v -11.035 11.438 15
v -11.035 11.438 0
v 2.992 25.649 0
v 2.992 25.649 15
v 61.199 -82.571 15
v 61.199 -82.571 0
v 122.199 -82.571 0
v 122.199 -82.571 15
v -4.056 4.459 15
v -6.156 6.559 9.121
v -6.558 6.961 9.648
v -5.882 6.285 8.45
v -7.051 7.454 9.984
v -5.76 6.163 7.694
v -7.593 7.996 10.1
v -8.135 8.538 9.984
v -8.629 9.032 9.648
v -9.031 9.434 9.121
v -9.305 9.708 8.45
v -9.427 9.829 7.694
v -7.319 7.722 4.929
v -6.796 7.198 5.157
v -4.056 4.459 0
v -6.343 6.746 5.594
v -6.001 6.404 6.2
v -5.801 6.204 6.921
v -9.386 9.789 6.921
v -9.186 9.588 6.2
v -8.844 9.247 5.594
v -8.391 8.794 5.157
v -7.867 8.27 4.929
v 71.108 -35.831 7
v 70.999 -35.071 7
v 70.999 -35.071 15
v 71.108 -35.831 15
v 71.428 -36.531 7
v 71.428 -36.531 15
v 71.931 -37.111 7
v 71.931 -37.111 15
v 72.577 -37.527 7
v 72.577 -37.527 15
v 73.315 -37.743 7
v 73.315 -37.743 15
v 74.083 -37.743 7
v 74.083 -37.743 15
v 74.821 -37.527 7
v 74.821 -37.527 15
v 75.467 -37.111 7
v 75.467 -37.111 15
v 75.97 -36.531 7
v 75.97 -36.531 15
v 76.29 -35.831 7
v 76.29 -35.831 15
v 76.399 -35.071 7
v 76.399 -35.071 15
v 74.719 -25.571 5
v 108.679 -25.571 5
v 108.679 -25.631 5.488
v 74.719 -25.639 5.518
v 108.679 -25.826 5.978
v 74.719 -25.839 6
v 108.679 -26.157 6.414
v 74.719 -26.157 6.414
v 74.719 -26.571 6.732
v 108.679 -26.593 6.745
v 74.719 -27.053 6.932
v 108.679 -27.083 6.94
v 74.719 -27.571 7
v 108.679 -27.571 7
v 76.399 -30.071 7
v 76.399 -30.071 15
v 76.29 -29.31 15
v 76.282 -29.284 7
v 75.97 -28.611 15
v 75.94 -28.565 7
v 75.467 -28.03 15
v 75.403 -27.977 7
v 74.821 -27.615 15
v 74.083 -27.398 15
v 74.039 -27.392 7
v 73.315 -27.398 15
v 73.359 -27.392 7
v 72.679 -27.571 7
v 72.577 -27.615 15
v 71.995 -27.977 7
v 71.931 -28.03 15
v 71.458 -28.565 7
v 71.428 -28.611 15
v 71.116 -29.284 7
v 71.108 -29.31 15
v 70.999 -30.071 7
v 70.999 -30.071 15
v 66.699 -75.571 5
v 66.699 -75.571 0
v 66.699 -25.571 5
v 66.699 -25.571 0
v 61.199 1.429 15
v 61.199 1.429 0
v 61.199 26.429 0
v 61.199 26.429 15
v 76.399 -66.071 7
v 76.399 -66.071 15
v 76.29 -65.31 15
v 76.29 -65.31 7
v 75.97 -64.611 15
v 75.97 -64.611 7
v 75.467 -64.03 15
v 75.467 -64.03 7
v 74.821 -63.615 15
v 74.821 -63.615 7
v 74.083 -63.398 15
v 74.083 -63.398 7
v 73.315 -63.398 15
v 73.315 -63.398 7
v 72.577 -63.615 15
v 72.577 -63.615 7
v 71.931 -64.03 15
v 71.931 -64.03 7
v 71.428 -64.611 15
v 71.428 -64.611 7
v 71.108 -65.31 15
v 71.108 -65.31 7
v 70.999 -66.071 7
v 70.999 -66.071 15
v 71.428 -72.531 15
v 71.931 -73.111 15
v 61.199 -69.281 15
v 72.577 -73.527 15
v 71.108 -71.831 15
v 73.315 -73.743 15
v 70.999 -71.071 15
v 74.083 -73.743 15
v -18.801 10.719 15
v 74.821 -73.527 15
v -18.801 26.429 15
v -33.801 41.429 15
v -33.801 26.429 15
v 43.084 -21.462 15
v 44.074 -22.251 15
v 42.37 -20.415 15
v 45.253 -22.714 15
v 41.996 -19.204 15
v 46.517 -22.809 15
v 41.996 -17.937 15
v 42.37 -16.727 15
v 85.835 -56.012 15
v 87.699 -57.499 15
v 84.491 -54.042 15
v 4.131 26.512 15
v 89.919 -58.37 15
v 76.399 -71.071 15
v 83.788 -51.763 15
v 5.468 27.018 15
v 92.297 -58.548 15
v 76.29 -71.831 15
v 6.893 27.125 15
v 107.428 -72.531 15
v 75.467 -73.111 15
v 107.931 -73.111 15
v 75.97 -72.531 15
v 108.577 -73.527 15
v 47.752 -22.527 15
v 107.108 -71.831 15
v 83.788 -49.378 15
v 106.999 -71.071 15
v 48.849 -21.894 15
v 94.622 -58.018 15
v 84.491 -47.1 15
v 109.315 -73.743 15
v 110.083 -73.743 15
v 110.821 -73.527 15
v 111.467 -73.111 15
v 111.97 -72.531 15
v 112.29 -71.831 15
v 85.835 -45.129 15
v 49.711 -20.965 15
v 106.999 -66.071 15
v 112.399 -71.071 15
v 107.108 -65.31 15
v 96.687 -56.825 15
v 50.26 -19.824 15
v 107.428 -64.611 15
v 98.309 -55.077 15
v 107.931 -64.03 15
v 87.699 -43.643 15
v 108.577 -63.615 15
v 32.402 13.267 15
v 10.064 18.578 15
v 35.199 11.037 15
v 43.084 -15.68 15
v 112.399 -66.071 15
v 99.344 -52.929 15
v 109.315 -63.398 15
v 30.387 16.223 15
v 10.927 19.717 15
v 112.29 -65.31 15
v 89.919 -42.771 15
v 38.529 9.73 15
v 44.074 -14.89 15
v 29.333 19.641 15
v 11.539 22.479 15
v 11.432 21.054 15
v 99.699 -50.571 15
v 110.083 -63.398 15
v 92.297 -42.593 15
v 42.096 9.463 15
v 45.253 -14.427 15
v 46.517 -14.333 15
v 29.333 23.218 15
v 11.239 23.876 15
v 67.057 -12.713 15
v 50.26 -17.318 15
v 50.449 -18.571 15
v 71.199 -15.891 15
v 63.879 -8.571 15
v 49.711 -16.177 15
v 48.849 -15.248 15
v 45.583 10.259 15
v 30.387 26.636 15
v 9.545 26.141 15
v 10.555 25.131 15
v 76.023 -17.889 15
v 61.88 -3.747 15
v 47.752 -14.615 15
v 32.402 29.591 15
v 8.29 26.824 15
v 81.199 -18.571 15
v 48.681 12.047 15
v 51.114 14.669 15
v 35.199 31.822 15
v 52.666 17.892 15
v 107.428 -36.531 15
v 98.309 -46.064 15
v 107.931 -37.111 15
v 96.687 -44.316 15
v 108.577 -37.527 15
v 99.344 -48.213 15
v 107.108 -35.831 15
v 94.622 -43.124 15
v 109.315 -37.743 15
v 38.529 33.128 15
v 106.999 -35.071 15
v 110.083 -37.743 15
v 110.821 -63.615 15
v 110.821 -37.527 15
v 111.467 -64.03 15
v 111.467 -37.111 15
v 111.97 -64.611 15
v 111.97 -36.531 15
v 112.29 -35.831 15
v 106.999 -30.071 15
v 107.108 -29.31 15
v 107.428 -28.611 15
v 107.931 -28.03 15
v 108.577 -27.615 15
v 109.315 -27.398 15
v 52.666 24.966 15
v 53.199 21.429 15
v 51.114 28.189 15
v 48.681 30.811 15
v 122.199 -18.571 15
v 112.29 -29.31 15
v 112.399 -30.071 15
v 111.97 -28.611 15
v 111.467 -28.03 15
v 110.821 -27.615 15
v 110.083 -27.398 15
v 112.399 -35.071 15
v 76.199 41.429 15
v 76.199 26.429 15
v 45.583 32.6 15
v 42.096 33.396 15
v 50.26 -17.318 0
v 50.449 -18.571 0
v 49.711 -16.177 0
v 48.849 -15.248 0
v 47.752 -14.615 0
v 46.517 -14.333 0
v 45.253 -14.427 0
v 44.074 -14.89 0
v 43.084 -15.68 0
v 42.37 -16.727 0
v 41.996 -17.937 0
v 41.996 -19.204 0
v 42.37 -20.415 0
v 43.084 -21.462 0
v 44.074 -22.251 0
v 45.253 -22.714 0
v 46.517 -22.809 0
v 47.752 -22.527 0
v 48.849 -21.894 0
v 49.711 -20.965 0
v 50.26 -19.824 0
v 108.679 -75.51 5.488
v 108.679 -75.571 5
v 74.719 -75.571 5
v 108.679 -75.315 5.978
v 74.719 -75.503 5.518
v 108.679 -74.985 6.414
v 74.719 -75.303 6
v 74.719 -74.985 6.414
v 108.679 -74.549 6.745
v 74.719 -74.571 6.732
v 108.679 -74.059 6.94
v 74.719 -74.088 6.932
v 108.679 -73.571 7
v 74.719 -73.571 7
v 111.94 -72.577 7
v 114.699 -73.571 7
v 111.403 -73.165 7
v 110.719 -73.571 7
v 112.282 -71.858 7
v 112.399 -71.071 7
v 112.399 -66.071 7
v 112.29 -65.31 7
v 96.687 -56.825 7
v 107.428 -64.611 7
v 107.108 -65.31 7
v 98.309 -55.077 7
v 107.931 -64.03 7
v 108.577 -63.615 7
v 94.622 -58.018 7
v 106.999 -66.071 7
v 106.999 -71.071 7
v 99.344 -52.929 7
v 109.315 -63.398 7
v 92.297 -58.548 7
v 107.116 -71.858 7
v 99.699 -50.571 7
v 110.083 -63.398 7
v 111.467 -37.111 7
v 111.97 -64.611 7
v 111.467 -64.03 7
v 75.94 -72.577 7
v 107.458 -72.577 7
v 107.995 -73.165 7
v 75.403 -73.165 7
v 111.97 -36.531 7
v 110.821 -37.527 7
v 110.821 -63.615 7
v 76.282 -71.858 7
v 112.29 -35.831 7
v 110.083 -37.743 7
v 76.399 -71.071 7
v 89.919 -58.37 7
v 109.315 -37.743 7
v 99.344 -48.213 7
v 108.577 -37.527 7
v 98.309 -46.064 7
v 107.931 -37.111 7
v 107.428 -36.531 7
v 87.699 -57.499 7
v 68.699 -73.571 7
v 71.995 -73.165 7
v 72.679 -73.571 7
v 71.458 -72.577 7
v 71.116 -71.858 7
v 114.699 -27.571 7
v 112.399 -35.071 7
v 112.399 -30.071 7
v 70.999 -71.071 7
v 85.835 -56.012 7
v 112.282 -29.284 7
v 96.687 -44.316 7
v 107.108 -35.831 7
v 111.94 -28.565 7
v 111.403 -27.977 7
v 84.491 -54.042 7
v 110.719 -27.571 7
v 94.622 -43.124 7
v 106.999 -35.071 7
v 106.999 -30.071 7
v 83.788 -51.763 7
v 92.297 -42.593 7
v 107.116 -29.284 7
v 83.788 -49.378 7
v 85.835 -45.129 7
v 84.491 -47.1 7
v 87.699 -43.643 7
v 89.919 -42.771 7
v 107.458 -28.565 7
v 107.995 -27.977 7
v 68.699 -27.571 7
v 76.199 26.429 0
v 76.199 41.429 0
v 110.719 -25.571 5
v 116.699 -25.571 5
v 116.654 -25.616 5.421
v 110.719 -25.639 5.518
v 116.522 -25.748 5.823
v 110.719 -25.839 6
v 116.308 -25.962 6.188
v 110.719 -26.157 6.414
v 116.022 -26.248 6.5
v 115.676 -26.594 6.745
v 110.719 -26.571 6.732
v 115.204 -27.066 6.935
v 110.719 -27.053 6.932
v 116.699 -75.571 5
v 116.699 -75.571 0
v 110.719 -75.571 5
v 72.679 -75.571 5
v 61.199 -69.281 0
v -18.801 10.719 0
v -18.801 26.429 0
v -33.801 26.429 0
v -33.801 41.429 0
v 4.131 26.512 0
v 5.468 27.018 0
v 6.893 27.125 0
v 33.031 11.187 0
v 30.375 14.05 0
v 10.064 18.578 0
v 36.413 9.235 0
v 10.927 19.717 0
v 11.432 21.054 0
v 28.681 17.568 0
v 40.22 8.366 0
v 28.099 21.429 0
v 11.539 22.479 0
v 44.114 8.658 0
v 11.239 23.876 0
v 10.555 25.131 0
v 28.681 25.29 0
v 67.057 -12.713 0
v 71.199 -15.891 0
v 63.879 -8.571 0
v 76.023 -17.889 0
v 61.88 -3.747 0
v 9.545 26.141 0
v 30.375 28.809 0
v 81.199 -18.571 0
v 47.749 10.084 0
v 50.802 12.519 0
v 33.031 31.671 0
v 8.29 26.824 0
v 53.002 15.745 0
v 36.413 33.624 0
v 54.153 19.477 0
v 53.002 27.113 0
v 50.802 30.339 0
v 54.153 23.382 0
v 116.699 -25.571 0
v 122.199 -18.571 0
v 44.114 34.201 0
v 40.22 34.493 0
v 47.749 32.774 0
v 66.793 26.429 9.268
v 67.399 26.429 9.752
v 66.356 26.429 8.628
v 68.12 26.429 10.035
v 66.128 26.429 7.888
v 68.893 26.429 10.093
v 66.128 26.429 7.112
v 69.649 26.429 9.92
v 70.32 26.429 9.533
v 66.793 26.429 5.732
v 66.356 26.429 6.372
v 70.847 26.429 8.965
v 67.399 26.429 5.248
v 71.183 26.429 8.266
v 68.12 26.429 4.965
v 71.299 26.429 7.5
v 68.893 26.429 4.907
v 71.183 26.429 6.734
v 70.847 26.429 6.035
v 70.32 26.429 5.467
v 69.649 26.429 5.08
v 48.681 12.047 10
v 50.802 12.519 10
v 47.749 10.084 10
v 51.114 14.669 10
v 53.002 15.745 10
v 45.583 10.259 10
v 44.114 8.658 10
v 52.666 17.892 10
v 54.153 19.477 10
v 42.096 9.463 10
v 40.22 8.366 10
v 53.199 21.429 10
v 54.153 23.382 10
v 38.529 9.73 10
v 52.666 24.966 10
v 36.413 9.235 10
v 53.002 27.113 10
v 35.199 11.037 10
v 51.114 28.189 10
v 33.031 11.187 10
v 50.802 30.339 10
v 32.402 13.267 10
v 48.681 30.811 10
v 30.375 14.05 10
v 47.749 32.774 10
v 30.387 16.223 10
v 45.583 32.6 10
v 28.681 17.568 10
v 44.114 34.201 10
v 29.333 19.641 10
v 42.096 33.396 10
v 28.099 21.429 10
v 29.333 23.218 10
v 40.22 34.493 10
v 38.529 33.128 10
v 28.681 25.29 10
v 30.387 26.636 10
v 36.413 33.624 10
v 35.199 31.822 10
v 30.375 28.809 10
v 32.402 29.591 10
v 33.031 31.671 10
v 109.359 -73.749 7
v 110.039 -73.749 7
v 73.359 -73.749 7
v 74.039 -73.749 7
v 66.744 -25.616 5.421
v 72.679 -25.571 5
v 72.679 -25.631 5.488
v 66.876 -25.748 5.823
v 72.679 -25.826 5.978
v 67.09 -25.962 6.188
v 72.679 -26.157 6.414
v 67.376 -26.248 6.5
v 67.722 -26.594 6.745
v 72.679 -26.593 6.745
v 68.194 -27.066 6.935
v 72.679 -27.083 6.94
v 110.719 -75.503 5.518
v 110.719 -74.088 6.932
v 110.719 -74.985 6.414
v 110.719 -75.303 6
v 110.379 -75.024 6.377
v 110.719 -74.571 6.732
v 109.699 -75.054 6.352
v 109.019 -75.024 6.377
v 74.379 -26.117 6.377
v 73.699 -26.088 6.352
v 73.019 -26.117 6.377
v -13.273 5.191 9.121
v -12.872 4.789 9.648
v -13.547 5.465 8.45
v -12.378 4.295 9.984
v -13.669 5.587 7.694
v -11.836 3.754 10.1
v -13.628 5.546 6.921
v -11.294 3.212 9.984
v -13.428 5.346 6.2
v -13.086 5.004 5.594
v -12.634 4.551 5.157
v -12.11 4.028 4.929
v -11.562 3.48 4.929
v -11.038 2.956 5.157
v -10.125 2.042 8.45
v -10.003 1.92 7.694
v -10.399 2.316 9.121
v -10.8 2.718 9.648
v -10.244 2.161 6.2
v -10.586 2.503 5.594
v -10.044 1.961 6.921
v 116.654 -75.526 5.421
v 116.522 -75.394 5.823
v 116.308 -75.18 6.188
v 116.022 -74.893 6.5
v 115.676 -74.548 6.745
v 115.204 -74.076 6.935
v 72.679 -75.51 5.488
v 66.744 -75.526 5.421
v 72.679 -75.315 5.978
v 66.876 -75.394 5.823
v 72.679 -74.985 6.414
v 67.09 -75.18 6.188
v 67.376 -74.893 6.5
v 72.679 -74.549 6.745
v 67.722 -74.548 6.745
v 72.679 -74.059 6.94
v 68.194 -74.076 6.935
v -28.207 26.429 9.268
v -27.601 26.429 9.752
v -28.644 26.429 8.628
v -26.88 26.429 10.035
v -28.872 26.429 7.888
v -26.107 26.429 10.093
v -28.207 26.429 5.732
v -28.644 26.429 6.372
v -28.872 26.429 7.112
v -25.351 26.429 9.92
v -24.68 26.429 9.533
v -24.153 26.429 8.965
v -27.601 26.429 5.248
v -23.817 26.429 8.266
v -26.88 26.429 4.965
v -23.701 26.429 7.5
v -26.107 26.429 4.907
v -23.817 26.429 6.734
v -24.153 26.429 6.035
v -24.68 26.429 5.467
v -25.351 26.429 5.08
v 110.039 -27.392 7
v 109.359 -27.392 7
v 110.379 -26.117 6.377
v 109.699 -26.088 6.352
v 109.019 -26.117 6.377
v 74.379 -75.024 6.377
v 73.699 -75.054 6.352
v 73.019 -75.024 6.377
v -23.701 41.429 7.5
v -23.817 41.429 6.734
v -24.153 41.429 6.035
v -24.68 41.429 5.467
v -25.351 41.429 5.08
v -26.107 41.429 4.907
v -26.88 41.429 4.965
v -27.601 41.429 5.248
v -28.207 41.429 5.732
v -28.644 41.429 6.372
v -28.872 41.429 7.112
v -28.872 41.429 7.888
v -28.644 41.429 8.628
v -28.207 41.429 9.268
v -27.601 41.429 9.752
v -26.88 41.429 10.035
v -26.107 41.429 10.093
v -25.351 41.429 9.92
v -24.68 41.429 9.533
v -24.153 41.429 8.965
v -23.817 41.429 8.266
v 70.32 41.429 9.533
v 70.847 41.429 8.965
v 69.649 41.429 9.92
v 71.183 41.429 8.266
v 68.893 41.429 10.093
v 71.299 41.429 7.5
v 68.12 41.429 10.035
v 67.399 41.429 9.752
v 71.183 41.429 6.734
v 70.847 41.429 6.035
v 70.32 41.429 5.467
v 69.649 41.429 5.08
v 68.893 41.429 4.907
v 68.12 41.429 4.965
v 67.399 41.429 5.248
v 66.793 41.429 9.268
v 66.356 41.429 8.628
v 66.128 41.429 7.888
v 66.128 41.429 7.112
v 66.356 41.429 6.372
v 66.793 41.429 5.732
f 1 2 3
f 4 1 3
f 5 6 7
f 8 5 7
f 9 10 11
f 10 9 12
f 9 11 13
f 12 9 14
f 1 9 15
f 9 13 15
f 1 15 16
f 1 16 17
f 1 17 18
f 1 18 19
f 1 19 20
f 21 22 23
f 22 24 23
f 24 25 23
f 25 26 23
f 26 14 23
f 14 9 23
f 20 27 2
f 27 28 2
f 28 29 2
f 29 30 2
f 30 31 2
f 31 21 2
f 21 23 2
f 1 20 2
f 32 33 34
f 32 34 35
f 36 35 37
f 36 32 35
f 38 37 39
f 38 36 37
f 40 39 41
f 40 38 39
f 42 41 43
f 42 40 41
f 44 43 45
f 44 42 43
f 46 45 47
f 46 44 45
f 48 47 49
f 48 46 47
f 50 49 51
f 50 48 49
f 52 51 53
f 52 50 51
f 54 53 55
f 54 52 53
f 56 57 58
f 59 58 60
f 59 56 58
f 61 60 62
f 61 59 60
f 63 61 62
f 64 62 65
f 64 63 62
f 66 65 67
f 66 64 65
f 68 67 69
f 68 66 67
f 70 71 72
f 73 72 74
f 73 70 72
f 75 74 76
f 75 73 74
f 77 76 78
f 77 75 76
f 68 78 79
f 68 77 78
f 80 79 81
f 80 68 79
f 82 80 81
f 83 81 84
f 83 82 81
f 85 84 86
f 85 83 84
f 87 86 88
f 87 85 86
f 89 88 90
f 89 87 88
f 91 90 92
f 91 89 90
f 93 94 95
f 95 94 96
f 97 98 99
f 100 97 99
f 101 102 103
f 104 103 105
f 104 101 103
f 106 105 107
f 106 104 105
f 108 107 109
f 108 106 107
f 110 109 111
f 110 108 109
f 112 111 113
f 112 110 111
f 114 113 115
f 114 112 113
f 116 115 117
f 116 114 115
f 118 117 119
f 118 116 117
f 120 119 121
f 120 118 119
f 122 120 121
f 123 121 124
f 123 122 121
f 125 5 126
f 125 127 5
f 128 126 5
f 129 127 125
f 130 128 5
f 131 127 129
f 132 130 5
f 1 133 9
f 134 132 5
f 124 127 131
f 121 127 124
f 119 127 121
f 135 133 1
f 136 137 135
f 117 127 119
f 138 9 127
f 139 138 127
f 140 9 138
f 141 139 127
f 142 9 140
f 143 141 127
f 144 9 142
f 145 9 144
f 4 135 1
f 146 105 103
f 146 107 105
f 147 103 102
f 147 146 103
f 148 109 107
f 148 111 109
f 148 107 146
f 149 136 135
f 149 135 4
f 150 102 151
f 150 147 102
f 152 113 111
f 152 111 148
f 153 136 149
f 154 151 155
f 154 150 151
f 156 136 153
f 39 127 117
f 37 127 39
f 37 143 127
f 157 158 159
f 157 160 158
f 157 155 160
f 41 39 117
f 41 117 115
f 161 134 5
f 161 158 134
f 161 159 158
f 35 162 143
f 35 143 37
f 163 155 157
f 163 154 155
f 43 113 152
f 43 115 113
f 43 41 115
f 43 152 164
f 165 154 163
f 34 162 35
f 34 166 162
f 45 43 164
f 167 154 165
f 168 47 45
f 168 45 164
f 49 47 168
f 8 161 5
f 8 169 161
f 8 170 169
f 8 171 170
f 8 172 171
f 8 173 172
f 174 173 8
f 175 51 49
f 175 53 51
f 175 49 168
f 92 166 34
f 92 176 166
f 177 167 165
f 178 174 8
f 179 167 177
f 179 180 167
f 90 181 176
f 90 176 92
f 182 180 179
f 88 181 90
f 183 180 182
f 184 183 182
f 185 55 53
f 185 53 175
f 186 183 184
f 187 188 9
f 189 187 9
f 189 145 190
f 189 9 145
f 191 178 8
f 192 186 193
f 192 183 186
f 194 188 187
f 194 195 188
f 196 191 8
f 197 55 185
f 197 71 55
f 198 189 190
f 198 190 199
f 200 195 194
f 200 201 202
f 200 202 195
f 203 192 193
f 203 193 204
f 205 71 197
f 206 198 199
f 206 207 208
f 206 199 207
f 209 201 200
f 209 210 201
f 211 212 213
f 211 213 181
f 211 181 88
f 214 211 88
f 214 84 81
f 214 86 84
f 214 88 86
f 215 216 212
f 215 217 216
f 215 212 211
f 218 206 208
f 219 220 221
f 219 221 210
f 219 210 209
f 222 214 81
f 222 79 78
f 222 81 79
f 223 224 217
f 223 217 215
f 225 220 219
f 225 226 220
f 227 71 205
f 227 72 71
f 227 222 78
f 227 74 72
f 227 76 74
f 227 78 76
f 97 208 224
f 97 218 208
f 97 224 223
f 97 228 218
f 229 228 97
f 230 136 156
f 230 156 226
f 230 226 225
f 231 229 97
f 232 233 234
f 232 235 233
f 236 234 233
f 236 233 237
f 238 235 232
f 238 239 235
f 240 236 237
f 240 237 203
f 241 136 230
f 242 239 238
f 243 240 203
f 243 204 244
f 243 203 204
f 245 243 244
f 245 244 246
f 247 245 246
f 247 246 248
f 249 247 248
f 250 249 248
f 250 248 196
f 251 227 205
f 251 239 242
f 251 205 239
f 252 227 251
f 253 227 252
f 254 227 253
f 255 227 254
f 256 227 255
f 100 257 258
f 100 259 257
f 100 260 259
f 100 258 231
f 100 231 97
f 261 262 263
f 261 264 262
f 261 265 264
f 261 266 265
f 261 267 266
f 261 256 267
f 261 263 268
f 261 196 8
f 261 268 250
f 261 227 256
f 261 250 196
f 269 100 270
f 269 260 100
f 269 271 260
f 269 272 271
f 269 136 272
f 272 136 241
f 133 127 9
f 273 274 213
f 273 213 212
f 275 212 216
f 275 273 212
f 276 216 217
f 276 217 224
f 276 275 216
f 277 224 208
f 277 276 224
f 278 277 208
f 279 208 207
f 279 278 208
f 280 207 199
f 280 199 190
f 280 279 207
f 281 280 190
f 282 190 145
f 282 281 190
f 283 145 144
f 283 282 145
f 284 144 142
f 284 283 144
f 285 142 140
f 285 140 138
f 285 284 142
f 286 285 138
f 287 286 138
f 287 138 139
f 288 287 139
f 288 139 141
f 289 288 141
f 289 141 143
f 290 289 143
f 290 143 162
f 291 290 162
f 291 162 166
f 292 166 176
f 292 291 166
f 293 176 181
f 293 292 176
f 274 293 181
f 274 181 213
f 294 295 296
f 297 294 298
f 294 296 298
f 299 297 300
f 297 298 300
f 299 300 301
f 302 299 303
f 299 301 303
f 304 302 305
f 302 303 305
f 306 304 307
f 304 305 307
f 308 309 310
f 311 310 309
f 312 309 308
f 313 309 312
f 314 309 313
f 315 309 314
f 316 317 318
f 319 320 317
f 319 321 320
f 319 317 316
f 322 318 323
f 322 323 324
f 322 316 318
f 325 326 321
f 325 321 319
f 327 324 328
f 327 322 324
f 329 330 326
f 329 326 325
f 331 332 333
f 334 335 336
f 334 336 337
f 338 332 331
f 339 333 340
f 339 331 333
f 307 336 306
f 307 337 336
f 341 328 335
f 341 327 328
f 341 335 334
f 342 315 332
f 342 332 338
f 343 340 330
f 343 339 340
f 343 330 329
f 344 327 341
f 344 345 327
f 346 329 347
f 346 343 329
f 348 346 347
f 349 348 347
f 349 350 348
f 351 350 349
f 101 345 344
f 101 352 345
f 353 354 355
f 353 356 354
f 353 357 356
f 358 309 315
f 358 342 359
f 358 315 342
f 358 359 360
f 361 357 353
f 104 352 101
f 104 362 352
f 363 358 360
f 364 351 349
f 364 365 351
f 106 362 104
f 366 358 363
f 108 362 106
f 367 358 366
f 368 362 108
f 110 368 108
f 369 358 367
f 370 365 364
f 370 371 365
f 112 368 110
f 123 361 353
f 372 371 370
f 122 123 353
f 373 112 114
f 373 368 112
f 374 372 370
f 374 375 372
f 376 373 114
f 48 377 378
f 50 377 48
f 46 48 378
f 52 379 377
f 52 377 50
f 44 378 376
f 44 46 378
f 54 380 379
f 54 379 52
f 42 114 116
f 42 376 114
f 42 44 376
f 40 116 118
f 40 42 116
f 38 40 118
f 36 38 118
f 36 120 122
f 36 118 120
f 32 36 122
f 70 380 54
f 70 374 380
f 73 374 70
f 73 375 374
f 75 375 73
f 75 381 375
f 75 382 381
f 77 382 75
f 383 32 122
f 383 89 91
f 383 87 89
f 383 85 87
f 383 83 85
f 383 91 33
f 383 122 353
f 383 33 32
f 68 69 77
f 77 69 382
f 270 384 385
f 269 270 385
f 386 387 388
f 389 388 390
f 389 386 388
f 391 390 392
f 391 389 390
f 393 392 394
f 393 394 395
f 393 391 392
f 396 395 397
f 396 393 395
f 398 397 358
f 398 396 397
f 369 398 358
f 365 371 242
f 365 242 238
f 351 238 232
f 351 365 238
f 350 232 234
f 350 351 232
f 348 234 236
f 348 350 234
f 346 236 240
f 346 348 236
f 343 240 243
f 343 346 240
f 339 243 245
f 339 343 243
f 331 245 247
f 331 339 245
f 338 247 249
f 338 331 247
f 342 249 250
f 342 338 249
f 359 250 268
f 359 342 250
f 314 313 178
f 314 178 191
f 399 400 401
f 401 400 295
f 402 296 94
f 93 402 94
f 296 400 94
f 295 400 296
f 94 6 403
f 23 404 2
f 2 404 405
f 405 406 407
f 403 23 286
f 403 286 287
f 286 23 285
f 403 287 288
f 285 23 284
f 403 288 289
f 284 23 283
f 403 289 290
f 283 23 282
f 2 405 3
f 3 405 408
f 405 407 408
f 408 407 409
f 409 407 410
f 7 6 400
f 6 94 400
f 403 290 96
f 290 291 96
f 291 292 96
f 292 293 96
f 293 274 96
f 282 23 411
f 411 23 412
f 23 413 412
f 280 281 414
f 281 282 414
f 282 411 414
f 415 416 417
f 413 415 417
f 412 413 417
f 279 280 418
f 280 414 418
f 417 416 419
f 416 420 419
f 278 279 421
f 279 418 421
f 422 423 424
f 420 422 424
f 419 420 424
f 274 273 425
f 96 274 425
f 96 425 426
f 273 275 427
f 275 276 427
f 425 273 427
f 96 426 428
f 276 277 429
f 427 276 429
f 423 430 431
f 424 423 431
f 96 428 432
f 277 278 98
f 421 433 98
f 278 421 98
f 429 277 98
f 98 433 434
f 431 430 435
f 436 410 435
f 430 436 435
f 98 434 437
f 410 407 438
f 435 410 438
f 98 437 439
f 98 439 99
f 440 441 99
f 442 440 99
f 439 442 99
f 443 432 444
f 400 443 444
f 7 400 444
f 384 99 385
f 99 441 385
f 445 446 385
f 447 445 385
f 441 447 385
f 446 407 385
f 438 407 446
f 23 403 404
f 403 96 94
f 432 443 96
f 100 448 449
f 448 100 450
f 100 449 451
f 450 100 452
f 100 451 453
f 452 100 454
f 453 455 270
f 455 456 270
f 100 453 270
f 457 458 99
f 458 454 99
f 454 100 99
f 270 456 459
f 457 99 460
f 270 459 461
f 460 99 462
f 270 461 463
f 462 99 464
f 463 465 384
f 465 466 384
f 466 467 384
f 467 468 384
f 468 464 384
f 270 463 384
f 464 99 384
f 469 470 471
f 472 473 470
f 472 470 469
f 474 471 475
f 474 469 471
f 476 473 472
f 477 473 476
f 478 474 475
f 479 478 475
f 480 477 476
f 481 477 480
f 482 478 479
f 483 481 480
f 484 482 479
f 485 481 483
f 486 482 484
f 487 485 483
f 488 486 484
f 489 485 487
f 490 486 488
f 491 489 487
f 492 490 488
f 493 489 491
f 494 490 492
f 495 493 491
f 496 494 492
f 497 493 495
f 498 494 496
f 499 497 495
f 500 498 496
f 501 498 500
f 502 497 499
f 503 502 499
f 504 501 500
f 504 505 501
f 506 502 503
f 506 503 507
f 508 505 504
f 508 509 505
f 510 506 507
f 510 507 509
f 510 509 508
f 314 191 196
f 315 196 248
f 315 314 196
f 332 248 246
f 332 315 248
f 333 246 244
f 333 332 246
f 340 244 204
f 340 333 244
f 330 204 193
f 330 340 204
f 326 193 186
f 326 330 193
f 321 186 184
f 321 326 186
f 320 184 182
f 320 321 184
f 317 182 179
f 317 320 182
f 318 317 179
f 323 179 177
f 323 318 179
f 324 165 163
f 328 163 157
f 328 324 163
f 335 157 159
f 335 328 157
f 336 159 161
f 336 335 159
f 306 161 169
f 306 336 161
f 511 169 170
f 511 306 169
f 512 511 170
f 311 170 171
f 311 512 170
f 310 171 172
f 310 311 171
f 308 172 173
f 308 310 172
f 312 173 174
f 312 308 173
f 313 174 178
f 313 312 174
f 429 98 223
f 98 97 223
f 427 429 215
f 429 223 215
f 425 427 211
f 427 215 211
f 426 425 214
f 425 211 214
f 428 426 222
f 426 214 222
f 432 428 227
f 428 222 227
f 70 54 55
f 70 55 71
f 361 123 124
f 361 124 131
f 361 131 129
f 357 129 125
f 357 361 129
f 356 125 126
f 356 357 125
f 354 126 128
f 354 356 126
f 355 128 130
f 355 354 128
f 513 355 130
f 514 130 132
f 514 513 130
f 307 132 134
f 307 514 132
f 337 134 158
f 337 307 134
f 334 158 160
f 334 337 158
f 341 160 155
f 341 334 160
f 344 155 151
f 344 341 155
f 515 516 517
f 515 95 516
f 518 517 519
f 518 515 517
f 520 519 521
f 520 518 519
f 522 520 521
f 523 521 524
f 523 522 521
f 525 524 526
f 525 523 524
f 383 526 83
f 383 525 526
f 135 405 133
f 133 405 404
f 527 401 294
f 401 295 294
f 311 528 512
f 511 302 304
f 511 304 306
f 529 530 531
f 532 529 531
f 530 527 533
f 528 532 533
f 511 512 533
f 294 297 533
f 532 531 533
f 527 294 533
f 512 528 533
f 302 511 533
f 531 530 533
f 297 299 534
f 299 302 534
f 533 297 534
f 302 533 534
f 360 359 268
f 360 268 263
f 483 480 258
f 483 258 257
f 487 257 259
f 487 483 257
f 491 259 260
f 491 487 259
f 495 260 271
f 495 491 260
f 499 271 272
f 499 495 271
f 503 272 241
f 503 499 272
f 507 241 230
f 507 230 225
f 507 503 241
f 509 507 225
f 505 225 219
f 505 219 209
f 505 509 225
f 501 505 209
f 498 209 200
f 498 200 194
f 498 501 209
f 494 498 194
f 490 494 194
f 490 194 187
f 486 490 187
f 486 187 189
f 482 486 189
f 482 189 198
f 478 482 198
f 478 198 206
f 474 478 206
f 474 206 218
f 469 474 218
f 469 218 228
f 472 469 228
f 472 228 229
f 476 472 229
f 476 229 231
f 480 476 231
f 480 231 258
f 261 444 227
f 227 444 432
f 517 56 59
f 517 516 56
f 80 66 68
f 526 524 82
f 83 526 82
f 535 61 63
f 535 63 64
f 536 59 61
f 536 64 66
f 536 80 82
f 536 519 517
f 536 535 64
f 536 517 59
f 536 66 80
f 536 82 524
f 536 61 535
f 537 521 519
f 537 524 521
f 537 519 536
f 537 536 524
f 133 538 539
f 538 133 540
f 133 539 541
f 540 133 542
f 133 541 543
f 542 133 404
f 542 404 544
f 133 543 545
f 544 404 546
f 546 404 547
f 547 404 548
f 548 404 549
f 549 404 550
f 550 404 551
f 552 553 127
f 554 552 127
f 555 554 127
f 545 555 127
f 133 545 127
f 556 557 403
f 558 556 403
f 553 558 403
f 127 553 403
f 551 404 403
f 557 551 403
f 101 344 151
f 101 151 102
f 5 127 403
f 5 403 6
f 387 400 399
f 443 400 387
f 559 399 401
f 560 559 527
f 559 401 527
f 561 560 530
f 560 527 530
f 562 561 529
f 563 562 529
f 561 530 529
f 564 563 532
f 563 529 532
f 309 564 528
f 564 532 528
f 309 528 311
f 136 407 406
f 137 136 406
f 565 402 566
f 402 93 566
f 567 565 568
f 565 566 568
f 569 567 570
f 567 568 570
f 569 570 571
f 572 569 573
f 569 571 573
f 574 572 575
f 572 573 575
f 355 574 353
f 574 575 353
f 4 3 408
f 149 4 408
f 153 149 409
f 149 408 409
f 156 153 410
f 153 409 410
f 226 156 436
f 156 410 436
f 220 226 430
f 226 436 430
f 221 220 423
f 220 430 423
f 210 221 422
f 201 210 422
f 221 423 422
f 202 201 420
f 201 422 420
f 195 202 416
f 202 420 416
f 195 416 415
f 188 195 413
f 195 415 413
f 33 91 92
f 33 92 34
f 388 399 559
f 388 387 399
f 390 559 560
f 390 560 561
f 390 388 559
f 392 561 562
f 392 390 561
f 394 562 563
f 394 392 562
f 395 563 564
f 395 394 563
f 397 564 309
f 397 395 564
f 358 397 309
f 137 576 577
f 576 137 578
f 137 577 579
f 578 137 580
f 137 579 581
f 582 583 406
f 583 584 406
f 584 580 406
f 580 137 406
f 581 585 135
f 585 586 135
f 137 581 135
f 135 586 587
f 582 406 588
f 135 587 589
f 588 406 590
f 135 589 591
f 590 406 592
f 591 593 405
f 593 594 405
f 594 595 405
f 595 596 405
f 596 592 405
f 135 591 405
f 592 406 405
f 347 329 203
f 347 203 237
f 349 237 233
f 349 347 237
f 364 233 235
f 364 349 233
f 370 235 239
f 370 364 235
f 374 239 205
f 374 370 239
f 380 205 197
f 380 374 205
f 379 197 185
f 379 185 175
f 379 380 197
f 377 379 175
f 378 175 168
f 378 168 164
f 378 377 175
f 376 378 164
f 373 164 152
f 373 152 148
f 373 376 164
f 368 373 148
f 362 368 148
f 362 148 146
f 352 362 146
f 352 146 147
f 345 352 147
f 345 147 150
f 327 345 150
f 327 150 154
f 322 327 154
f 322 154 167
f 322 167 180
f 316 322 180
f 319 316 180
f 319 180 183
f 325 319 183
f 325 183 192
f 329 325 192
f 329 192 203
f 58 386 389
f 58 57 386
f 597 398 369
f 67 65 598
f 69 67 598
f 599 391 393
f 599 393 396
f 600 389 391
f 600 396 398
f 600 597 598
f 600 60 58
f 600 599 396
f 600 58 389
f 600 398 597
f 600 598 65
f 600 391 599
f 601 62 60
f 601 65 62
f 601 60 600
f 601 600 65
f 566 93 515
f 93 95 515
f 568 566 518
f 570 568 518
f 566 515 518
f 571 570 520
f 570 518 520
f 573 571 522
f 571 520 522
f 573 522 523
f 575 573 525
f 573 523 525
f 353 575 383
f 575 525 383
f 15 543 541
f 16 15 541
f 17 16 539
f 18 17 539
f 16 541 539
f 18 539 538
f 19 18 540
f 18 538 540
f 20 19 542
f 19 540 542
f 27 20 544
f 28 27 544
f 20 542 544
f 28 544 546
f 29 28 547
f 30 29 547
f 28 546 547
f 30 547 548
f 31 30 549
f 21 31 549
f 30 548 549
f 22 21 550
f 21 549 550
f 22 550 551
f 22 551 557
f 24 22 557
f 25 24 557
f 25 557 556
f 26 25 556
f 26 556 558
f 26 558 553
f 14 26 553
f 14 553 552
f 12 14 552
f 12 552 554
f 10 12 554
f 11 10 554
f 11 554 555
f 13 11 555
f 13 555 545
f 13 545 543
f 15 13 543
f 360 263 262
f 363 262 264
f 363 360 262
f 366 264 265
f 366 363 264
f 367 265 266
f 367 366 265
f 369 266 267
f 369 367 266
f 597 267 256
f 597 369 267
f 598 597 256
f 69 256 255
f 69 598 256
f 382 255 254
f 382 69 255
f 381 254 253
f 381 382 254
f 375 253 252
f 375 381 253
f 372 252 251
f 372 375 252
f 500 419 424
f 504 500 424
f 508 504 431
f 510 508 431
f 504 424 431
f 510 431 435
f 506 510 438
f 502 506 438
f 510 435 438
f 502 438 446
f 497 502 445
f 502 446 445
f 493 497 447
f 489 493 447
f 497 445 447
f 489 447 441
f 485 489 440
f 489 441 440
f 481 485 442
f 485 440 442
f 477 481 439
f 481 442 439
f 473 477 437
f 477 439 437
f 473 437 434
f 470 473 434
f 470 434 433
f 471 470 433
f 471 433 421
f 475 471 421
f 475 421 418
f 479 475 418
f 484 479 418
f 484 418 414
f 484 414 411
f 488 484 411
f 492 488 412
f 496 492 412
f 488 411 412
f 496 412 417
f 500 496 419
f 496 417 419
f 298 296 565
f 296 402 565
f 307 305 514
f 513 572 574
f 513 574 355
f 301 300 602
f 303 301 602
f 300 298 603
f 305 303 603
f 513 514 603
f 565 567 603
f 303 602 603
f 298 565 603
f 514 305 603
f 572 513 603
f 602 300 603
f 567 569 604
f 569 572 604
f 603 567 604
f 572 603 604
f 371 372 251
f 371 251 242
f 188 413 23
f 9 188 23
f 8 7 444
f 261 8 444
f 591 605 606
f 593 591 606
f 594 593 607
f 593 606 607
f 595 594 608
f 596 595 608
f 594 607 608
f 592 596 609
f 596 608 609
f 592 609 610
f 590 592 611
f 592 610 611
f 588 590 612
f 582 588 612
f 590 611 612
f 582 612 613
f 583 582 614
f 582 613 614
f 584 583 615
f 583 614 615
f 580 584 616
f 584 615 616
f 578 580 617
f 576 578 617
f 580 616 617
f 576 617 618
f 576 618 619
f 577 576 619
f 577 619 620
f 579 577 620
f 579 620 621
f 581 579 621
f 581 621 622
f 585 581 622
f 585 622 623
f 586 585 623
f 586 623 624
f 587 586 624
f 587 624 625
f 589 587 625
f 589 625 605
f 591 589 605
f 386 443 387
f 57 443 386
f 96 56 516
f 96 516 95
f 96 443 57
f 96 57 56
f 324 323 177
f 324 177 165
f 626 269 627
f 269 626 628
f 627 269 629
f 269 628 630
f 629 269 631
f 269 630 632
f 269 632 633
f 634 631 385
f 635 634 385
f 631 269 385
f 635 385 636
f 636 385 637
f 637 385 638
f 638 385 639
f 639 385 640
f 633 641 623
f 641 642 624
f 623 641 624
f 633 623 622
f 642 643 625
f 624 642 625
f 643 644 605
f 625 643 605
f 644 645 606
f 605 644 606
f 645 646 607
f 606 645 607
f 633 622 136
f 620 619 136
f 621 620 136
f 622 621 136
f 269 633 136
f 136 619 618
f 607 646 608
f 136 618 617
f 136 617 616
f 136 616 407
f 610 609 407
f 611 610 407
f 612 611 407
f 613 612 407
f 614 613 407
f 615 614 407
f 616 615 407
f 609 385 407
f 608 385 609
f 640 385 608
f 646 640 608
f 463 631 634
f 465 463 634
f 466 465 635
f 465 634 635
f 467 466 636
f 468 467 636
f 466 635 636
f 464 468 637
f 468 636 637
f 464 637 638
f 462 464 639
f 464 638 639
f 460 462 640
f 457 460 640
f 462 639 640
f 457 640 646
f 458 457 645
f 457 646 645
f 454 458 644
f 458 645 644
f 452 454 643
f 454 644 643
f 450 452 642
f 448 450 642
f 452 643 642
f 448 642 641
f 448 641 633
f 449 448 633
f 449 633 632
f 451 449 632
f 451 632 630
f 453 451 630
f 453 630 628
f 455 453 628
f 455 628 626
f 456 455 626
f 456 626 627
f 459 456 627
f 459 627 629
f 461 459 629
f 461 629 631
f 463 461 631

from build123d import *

# Parameters (mm, degrees)
SKETCH_1_R          = 12
SKETCH_1_R_2        = 4.25
SKETCH_1_R_3        = 8
EXTRUDE_1_DEPTH     = 15
SKETCH_2_R          = 13.1
CUT_EXTRUDE_1_DEPTH = 10
CUT_EXTRUDE_2_REACH = 176.739
SKETCH_3_R          = 2.6
SKETCH_5_R          = 2.6
CUT_EXTRUDE_3_DEPTH = 10
SKETCH_6_W          = 50
SKETCH_6_H          = 50
CUT_EXTRUDE_4_DEPTH = 7
FILLET_1_R          = 2
FILLET_2_R          = 20


with BuildPart() as part:
    # 草图1 → 凸台-拉伸1 (new body)
    with BuildSketch(Plane.XY):
        Polygon((-33.800989673, 26.429197467), (-27.44059998, 26.429197467), (-18.800989673, 26.429197467), (-18.800989673, 10.718519348), (61.199010327, -69.281480652), (61.199010327, -82.570802533), (122.199010327, -82.570802533), (122.199010327, -18.570802533), (61.199010327, -18.570802533), (61.199010327, 26.429197467), (76.199010327, 26.429197467), (76.199010327, 41.429197467), (56.199010327, 41.429197467), (-33.800989673, 41.429197467), align=None)
        with Locations((41.199010327, 21.429197467)):
            Circle(SKETCH_1_R, mode=Mode.SUBTRACT)
        with Locations((46.199010327, -18.570802533)):
            Circle(SKETCH_1_R_2, mode=Mode.SUBTRACT)
        with Locations((91.699010327, -50.570802533)):
            Circle(SKETCH_1_R_3, mode=Mode.SUBTRACT)
        with BuildLine():
            Line((-11.034973369, 11.437784418), (2.9923212, 25.648765615))
            ThreePointArc((2.9923212, 25.648765615), (10.086164278, 25.671985824), (10.063536665, 18.57814083))
            Line((10.063536665, 18.57814083), (-4.055896558, 4.458707607))
            Line((-4.055896558, 4.458707607), (-11.034973369, 11.437784418))
        make_face(mode=Mode.SUBTRACT)
        with BuildLine():
            Line((106.999010327, -30.070802533), (106.999010327, -35.070802533))
            ThreePointArc((106.999010327, -35.070802533), (109.699010327, -37.770802533), (112.399010327, -35.070802533))
            Line((112.399010327, -35.070802533), (112.399010327, -30.070802533))
            ThreePointArc((112.399010327, -30.070802533), (109.699010327, -27.370802533), (106.999010327, -30.070802533))
        make_face(mode=Mode.SUBTRACT)
        with BuildLine():
            Line((70.999010327, -30.070802533), (70.999010327, -35.070802533))
            ThreePointArc((70.999010327, -35.070802533), (73.699010327, -37.770802533), (76.399010327, -35.070802533))
            Line((76.399010327, -35.070802533), (76.399010327, -30.070802533))
            ThreePointArc((76.399010327, -30.070802533), (73.699010327, -27.370802533), (70.999010327, -30.070802533))
        make_face(mode=Mode.SUBTRACT)
        with BuildLine():
            Line((76.399010327, -71.070802533), (76.399010327, -66.070802533))
            ThreePointArc((76.399010327, -66.070802533), (73.699010327, -63.370802533), (70.999010327, -66.070802533))
            Line((70.999010327, -66.070802533), (70.999010327, -71.070802533))
            ThreePointArc((70.999010327, -71.070802533), (73.699010327, -73.770802533), (76.399010327, -71.070802533))
        make_face(mode=Mode.SUBTRACT)
        with BuildLine():
            Line((112.399010327, -71.070802533), (112.399010327, -66.070802533))
            ThreePointArc((112.399010327, -66.070802533), (109.699010327, -63.370802533), (106.999010327, -66.070802533))
            Line((106.999010327, -66.070802533), (106.999010327, -71.070802533))
            ThreePointArc((106.999010327, -71.070802533), (109.699010327, -73.770802533), (112.399010327, -71.070802533))
        make_face(mode=Mode.SUBTRACT)
    extrude(amount=EXTRUDE_1_DEPTH)

    # 草图2 → 切除-拉伸1 (cut)
    with BuildSketch(Plane(origin=(0, 0, 0), x_dir=(-1, 0, 0), z_dir=(0, 0, -1))):
        with Locations((-41.199010327, 21.429197467)):
            Circle(SKETCH_2_R)
    extrude(amount=-CUT_EXTRUDE_1_DEPTH, mode=Mode.SUBTRACT)

    # 草图3 → 切除-拉伸2 (cut, up to next)
    with BuildSketch(Plane(origin=(0, 41.429197467, 0), x_dir=(1, 0, 0), z_dir=(0, 1, 0)), mode=Mode.PRIVATE) as cut_extrude_2_sk1:
        with Locations((-26.300989673, -7.5)):
            Circle(SKETCH_3_R)
    cut_extrude_2_tool1 = extrude(cut_extrude_2_sk1.sketch, amount=-CUT_EXTRUDE_2_REACH, mode=Mode.PRIVATE) & part.part
    # 草图3 → 切除-拉伸2 (cut, up to next)
    with BuildSketch(Plane(origin=(0, 41.429197467, 0), x_dir=(1, 0, 0), z_dir=(0, 1, 0)), mode=Mode.PRIVATE) as cut_extrude_2_sk2:
        with Locations((68.699010327, -7.5)):
            Circle(SKETCH_3_R)
    cut_extrude_2_tool2 = extrude(cut_extrude_2_sk2.sketch, amount=-CUT_EXTRUDE_2_REACH, mode=Mode.PRIVATE) & part.part
    add(cut_extrude_2_tool1.solids().sort_by_distance((-26.30099, 41.429197, 7.5))[0], mode=Mode.SUBTRACT)
    add(cut_extrude_2_tool2.solids().sort_by_distance((68.69901, 41.429197, 7.5))[0], mode=Mode.SUBTRACT)

    # 草图5 → 切除-拉伸3 (cut)
    with BuildSketch(Plane(origin=(-4.041235162, -4.041235162, 0), x_dir=(0, 0, 1), z_dir=(-0.7071067811865485, -0.7071067811865467, 0))):
        with Locations((7.5, 11.023445006)):
            Circle(SKETCH_5_R)
    extrude(amount=-CUT_EXTRUDE_3_DEPTH, mode=Mode.SUBTRACT)

    # 草图6 → 切除-拉伸4 (cut)
    with BuildSketch(Plane(origin=(0, 0, 0), x_dir=(-1, 0, 0), z_dir=(0, 0, -1))):
        with Locations((-91.699010327, -50.570802533)):
            Rectangle(SKETCH_6_W, SKETCH_6_H)
    extrude(amount=-CUT_EXTRUDE_4_DEPTH, mode=Mode.SUBTRACT)

    # 圆角1
    fillet_1_edges = [part.edges().sort_by_distance(p)[0] for p in [
        (91.699010327, -75.570802533, 7),
        (116.699010327, -50.570802533, 7),
        (66.699010327, -50.570802533, 7),
        (91.699010327, -25.570802533, 7),
    ]]
    fillet(fillet_1_edges, radius=FILLET_1_R)

    # 圆角2
    fillet_2_edges = [part.edges().sort_by_distance(p)[0] for p in [
        (61.199010327, -18.570802533, 7.5),
    ]]
    fillet(fillet_2_edges, radius=FILLET_2_R)


solid = part.part
